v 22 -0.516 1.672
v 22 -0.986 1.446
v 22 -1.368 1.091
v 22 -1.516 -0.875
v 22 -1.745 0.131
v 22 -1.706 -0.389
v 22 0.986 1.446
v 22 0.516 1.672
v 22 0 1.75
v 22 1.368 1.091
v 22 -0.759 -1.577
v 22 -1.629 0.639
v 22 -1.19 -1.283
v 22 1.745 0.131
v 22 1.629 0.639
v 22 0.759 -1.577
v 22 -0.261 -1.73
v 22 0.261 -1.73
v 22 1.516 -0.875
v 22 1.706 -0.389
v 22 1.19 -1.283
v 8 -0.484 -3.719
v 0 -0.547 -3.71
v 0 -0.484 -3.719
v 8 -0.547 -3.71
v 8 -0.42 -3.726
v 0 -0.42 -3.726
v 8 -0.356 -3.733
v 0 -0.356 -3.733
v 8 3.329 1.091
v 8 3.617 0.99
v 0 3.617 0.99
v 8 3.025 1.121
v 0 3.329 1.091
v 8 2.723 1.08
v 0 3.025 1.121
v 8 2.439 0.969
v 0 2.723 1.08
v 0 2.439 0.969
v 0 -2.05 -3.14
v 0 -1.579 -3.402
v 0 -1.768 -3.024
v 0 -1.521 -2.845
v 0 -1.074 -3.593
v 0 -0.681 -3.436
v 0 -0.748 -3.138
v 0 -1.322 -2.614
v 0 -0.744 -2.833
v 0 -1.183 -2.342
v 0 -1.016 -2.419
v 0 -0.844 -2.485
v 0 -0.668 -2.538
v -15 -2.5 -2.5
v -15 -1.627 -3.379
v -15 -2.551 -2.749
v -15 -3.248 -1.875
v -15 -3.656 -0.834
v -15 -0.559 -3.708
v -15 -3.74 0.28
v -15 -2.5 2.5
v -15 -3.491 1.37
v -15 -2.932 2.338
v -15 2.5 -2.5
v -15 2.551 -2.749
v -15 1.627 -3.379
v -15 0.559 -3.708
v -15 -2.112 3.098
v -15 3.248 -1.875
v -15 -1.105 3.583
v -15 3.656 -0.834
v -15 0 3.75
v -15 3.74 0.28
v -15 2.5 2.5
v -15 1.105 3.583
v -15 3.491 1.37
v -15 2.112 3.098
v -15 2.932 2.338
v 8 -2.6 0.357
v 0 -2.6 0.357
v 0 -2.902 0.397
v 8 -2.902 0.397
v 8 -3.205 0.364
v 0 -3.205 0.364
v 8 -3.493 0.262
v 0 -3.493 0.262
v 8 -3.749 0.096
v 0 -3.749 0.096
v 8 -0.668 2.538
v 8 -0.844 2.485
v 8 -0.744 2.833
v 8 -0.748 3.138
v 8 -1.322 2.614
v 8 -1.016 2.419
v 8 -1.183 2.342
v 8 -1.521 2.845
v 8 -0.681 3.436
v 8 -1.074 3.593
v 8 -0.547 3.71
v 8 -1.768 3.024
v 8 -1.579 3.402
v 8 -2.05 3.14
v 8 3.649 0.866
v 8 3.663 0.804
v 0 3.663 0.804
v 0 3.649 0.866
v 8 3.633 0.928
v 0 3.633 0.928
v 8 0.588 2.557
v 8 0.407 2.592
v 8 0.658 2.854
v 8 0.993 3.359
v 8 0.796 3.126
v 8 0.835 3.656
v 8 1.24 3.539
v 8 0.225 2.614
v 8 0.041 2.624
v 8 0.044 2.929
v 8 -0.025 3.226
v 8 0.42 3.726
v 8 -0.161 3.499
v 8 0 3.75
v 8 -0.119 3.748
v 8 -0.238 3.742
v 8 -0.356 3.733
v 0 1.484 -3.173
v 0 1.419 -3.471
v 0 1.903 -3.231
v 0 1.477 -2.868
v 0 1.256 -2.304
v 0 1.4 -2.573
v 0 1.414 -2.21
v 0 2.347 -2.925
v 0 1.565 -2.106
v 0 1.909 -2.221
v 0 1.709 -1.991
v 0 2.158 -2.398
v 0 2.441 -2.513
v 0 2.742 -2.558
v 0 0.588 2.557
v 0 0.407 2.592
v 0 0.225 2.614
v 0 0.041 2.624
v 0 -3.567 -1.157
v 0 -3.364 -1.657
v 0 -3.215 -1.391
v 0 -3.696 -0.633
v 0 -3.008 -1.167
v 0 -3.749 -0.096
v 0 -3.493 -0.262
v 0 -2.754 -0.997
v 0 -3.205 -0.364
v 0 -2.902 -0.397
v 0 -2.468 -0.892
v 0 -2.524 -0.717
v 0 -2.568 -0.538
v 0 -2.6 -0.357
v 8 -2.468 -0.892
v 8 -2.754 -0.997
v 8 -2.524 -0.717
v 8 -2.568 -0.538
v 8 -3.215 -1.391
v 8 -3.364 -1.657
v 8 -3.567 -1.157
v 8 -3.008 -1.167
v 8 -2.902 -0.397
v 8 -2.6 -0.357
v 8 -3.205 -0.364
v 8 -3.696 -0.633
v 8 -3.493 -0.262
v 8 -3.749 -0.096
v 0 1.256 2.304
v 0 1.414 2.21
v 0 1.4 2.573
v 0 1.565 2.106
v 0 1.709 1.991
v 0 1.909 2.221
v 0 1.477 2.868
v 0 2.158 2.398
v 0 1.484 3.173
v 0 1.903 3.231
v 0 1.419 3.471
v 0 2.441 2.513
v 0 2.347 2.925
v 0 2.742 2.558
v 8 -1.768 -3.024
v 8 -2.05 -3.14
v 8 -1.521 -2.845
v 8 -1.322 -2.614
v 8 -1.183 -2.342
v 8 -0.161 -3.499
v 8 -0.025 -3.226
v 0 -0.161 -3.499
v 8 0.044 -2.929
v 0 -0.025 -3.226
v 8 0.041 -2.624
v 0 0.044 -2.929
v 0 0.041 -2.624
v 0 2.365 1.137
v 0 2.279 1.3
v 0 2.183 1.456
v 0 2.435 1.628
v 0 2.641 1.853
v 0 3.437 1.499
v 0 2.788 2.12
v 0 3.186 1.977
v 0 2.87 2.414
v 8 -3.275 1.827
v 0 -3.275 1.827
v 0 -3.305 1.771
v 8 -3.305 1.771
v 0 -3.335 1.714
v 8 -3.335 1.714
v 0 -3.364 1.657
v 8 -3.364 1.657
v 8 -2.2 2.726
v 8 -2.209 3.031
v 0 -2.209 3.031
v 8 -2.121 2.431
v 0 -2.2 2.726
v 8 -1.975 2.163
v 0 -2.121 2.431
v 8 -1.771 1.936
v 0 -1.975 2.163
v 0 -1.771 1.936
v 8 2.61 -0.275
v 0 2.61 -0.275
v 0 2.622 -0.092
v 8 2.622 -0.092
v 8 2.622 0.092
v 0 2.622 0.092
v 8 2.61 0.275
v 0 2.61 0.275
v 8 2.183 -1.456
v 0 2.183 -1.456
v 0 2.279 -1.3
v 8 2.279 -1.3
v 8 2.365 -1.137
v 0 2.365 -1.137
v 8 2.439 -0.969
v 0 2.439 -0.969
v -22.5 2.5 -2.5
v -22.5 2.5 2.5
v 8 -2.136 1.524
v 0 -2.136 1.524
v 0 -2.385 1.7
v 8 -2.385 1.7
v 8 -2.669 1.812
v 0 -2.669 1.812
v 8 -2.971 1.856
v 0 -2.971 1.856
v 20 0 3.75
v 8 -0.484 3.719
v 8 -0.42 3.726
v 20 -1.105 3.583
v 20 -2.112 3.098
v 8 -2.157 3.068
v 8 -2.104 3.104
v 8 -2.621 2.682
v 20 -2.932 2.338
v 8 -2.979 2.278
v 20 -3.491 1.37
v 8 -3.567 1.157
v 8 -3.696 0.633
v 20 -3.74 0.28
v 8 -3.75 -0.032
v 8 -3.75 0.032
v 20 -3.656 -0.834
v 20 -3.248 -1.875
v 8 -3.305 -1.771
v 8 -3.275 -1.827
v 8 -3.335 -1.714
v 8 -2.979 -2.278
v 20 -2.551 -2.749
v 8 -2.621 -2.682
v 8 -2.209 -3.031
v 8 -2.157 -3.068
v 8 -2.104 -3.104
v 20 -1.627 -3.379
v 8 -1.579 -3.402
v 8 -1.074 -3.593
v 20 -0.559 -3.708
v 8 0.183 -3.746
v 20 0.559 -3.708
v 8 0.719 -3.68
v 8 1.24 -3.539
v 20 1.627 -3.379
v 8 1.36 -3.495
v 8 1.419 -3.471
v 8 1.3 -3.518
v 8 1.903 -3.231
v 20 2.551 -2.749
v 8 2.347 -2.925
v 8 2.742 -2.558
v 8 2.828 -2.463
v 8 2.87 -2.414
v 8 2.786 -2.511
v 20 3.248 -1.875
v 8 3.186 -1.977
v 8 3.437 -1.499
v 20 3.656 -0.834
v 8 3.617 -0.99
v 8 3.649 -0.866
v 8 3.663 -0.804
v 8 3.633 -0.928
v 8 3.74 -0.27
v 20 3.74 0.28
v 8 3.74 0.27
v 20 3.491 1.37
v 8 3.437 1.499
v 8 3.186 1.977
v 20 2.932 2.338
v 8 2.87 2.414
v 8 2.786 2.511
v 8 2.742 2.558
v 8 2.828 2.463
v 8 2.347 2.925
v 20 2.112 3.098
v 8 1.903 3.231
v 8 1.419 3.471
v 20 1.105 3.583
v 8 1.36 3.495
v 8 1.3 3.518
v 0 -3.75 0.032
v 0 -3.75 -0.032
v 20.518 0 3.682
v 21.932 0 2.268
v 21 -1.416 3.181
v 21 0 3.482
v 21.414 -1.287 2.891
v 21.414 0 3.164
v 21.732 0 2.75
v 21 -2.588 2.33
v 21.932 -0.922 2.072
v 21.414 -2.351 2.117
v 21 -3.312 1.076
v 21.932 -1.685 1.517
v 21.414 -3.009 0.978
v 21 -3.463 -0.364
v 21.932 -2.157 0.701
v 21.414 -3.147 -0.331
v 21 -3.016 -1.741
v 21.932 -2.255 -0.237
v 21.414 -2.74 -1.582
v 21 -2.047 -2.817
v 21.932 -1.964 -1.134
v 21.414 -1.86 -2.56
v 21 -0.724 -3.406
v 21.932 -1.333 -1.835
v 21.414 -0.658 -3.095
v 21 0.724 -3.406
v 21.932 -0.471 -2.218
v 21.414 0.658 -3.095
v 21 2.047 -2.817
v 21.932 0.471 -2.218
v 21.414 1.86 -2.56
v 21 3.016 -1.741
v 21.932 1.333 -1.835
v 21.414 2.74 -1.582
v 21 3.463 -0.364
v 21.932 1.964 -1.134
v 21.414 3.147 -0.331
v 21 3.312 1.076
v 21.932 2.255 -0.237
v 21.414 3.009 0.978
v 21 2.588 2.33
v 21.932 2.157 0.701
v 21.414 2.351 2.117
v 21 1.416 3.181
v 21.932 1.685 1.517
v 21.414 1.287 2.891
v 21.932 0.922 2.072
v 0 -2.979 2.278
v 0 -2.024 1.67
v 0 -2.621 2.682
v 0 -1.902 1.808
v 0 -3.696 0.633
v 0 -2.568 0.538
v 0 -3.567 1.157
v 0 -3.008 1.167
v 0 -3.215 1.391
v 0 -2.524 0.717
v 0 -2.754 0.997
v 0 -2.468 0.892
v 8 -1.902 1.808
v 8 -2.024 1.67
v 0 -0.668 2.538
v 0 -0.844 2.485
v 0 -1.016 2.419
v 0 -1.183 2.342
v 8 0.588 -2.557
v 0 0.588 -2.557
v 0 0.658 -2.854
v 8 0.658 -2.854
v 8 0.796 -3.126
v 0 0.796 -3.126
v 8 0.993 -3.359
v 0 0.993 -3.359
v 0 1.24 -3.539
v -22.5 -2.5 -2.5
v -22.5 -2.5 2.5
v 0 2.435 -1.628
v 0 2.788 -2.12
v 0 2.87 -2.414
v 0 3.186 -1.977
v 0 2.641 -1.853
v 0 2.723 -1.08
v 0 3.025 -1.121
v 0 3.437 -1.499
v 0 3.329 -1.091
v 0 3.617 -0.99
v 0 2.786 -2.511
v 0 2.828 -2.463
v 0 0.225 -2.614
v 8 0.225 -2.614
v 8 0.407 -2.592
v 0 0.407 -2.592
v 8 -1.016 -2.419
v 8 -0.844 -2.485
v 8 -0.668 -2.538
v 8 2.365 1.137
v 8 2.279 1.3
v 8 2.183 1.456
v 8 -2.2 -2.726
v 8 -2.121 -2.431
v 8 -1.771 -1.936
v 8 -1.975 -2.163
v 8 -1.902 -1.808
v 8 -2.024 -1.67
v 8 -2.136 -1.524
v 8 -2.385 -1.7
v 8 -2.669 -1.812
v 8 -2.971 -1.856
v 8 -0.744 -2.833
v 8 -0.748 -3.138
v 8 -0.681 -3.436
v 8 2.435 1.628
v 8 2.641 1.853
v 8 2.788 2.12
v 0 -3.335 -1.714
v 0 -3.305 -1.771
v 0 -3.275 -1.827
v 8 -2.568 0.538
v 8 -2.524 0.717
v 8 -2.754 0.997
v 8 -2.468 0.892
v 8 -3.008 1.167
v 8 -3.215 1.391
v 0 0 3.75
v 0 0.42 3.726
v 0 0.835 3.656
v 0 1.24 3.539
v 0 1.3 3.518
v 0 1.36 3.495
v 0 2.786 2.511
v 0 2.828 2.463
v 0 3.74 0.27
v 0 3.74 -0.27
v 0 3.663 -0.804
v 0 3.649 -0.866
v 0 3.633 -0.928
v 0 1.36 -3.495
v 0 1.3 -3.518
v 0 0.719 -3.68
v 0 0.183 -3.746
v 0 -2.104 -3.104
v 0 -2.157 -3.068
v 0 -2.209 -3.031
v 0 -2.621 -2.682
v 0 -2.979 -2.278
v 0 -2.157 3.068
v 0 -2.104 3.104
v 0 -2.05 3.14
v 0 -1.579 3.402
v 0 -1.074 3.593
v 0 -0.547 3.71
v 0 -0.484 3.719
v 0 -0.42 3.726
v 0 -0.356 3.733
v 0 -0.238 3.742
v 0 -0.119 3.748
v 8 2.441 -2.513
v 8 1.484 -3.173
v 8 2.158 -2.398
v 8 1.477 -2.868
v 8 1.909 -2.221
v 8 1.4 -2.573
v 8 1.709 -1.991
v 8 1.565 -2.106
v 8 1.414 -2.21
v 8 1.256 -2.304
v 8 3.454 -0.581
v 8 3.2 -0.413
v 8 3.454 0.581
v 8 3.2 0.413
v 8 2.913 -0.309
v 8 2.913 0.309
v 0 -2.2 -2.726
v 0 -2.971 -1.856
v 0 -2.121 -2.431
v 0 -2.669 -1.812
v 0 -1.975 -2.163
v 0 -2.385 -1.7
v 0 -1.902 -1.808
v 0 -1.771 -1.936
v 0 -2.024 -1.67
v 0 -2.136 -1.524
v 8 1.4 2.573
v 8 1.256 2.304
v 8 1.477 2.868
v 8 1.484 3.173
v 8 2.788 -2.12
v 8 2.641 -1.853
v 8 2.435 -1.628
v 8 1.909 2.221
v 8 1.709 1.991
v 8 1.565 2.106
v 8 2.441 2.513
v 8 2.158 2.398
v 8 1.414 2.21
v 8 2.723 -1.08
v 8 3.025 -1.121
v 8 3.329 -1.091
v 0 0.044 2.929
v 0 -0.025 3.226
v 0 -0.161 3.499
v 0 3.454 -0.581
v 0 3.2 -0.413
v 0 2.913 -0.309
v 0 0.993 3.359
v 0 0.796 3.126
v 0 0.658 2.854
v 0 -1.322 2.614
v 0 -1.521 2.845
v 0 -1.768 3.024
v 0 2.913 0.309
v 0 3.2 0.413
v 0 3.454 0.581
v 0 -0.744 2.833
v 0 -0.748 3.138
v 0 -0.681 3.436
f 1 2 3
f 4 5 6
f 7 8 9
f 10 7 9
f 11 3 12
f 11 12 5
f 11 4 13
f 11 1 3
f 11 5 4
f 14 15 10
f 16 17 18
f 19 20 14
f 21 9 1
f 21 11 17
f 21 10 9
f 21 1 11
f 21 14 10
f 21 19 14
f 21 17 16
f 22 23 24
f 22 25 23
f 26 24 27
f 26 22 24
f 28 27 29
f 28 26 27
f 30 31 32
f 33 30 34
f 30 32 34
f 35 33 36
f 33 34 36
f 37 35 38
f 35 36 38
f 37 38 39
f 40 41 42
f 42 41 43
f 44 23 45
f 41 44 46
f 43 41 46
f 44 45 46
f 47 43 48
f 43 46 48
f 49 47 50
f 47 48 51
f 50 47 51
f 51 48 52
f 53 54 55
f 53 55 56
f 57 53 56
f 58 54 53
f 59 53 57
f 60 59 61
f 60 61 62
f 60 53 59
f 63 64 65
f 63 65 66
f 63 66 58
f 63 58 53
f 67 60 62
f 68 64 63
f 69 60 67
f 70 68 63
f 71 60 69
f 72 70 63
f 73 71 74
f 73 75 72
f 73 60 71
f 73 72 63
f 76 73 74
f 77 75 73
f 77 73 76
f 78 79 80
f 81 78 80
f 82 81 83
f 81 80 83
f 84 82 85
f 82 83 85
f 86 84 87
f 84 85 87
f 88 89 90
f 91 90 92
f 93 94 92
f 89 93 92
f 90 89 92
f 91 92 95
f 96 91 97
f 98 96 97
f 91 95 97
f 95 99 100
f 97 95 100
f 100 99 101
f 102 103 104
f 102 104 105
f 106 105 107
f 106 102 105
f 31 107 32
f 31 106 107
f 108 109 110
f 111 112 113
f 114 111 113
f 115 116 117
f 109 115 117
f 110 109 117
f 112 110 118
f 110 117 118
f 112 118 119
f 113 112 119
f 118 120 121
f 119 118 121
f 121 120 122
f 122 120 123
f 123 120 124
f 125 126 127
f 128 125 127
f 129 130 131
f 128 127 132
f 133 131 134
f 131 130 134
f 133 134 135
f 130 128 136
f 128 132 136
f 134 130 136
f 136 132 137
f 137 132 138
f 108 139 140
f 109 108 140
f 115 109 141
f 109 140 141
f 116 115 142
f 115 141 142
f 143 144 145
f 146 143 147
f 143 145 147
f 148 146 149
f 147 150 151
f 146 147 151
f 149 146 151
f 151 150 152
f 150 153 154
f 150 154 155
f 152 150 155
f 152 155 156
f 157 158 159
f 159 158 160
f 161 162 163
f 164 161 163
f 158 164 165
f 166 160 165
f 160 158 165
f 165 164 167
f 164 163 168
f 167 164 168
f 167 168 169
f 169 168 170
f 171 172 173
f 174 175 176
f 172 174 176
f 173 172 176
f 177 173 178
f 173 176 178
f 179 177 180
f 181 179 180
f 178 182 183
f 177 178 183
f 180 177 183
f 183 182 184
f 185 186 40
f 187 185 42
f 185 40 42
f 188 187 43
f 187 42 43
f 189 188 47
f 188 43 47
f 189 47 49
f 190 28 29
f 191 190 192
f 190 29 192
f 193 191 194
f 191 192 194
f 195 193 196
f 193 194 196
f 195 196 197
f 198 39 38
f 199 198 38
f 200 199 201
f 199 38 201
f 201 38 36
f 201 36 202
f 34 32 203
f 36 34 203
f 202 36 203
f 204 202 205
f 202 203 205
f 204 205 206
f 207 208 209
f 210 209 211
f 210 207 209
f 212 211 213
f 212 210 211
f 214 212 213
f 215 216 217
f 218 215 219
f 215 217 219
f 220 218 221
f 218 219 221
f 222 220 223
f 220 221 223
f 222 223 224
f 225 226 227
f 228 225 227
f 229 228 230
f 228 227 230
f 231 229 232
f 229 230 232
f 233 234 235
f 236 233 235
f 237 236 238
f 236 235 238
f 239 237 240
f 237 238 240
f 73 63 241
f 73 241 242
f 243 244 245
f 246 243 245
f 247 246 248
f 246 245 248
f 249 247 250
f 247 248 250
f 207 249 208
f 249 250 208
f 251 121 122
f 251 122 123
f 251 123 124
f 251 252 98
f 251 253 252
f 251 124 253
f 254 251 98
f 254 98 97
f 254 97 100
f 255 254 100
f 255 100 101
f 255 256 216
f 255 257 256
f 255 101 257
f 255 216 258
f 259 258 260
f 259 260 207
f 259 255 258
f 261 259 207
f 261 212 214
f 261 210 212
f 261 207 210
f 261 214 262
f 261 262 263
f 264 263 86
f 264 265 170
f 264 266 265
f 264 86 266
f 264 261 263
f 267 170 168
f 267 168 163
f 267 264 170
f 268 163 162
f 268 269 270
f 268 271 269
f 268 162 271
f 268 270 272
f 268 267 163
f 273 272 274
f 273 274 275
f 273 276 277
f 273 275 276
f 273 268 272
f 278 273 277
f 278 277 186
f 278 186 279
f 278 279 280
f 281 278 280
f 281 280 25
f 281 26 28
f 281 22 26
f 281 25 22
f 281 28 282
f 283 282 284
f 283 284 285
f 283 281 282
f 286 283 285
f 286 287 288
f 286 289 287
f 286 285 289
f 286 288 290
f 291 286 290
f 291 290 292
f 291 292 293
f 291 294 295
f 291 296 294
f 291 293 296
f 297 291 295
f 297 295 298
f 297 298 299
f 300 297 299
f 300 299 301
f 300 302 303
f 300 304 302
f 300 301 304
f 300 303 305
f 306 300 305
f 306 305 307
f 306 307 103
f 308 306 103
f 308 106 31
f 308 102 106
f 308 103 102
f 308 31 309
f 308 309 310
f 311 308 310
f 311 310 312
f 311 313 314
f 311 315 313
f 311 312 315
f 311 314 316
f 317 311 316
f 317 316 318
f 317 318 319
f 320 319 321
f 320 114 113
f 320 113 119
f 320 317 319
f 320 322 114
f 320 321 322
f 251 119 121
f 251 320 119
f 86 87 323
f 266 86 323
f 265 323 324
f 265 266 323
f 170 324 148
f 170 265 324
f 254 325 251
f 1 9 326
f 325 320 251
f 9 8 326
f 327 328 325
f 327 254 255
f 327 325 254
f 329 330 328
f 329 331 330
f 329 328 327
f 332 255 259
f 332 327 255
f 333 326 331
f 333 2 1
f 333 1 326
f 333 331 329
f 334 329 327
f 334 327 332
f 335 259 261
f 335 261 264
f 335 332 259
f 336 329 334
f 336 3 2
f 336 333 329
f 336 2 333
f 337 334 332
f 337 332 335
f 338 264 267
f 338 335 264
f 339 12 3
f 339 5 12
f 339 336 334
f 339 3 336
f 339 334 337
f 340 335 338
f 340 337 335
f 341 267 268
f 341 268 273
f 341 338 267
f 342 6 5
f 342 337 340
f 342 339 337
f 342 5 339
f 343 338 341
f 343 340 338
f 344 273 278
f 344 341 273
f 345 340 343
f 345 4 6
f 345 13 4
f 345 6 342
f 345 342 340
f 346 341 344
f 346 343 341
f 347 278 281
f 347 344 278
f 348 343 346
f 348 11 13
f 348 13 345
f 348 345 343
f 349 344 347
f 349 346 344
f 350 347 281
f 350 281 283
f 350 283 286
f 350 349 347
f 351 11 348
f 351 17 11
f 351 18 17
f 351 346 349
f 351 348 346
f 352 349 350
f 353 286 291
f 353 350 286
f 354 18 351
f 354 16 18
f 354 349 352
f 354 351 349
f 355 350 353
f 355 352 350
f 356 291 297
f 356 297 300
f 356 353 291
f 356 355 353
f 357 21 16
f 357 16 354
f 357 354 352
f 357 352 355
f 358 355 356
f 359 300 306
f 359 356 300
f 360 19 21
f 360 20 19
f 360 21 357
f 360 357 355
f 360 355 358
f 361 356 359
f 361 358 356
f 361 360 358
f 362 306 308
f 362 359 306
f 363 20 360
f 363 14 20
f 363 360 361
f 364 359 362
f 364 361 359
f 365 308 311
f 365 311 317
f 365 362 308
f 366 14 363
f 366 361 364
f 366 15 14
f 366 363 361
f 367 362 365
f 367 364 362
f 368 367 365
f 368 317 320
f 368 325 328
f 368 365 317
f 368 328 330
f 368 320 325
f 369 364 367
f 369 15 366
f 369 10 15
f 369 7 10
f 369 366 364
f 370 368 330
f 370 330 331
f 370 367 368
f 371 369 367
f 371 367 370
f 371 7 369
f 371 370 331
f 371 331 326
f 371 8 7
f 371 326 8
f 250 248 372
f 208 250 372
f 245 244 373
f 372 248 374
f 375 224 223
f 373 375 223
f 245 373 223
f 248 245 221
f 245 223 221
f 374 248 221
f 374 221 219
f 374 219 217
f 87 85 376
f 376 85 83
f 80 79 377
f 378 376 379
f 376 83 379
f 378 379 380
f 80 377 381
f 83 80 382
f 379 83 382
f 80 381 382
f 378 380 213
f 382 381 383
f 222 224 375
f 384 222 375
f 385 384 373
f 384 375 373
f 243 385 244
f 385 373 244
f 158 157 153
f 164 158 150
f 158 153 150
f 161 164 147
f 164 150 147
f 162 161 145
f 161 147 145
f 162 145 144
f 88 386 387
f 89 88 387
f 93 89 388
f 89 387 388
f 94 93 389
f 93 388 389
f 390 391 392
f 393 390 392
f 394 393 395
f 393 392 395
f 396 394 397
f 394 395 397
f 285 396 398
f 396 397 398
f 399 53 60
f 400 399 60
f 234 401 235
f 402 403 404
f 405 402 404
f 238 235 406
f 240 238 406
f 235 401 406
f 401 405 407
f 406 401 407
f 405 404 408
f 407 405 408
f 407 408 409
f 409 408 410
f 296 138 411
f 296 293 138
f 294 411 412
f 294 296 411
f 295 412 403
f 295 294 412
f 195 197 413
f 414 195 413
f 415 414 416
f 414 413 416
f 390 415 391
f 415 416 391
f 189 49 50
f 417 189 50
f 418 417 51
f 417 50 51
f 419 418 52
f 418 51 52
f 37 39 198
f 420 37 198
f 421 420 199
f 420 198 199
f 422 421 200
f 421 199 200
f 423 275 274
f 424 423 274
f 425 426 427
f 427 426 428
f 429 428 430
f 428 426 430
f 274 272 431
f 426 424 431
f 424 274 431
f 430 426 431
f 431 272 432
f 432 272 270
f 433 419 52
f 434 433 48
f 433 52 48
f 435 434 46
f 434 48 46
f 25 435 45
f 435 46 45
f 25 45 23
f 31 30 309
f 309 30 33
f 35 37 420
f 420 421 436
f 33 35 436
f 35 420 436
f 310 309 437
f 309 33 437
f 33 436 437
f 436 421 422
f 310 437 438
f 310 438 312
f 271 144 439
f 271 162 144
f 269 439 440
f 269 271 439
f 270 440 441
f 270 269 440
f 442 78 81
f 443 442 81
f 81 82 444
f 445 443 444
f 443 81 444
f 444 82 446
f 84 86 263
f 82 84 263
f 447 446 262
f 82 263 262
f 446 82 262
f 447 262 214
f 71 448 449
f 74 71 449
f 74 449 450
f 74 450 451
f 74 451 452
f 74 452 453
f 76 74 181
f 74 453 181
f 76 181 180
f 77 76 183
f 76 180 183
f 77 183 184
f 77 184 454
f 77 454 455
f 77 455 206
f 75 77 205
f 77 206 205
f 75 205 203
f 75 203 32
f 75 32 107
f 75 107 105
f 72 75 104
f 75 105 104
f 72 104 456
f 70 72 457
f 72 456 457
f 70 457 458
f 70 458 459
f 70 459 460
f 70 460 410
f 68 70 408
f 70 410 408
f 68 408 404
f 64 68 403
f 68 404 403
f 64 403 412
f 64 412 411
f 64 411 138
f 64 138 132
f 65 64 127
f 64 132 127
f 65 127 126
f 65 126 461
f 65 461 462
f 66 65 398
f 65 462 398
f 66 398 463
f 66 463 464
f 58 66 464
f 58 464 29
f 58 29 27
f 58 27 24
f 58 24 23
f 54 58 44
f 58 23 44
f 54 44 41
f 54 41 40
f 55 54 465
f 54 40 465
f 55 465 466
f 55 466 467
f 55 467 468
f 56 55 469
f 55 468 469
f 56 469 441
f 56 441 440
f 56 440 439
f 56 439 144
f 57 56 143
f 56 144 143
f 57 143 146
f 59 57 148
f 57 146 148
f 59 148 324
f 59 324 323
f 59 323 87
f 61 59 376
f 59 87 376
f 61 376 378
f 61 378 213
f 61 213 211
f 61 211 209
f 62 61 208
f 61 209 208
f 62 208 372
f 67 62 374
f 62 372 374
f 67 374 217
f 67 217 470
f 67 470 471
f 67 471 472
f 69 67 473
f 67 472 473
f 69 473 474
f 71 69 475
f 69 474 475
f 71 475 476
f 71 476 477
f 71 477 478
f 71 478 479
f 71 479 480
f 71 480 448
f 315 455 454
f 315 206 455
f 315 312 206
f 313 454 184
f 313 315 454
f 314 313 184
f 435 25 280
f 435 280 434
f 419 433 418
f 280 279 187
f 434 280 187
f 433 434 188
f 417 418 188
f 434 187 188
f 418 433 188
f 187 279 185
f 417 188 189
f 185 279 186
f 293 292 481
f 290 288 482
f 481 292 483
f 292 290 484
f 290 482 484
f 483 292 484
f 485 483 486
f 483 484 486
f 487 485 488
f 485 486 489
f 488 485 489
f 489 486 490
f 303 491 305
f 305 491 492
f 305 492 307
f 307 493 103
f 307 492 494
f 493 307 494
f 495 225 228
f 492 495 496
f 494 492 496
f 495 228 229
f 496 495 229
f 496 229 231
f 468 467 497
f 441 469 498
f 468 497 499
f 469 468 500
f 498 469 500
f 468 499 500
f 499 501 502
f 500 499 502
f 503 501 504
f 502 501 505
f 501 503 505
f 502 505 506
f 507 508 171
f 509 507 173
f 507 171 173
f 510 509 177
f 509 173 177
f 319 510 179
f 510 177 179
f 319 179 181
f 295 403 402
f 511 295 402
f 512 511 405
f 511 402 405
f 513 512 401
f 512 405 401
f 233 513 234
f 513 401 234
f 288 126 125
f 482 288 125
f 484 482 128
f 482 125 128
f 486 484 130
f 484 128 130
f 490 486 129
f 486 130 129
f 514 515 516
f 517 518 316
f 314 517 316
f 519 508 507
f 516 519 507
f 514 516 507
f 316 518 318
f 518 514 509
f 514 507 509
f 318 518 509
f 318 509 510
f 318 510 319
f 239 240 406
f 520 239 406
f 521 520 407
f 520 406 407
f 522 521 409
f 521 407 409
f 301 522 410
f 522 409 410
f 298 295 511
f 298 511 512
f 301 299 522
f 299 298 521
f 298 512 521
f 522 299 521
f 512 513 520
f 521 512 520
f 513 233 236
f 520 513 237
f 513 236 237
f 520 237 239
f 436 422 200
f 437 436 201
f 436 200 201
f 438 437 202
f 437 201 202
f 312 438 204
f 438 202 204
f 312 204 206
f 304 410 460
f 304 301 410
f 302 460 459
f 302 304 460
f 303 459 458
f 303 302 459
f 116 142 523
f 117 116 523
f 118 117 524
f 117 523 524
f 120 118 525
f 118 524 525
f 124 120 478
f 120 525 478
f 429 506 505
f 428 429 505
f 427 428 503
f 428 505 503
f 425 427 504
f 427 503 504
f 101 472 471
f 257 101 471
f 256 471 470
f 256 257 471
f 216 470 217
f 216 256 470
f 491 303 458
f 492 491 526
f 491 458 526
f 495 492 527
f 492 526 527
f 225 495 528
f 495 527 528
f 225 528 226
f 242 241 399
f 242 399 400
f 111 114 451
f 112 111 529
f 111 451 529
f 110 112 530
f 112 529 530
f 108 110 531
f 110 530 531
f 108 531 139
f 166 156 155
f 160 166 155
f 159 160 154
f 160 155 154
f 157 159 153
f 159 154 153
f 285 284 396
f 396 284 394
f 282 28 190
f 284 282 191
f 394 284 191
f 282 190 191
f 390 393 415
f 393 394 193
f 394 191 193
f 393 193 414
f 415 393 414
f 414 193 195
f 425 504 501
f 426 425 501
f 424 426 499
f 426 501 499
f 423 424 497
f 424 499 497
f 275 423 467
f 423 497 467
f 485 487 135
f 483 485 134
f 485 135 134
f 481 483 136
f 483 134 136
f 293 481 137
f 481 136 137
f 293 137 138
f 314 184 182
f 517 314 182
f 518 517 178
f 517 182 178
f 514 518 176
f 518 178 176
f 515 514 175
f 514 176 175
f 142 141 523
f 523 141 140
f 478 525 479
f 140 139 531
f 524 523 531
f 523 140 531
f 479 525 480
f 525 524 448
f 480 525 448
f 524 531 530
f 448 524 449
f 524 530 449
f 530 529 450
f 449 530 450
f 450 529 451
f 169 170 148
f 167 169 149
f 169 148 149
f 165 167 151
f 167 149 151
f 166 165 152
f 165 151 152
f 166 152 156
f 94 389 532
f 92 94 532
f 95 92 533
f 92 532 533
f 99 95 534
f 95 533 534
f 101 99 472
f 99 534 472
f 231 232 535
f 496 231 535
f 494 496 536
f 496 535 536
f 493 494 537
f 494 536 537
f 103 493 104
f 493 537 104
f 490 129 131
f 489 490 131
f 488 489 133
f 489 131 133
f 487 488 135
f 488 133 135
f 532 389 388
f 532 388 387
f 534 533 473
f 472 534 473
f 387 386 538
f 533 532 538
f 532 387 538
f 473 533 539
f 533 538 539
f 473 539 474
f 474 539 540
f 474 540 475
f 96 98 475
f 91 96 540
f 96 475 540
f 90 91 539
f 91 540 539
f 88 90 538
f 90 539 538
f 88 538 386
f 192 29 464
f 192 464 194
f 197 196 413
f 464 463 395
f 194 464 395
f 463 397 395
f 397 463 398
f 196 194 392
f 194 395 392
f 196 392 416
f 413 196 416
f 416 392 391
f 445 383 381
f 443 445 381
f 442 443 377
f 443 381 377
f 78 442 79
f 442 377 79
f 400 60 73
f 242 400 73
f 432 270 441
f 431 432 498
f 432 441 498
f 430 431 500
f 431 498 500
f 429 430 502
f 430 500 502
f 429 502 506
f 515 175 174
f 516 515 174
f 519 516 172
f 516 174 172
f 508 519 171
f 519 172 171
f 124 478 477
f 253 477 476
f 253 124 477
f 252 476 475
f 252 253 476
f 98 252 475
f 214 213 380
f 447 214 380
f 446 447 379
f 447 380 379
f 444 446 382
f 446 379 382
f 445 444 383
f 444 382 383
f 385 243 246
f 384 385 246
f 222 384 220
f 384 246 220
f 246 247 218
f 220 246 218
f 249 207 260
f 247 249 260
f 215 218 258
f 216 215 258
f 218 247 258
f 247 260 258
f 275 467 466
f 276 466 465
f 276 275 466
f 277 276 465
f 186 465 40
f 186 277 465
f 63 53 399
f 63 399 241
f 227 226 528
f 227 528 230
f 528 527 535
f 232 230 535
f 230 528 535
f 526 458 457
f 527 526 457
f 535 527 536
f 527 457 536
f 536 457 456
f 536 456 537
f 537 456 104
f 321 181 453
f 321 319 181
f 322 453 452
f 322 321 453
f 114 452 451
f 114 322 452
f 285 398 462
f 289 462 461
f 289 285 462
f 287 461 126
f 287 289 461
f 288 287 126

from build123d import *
from build123d.topology import SkipClean

# Parameters (mm, degrees)
BASPROSKE_W         = 8
BASPROSKE_H         = 3.75
TOOTHCUT_DEPTH      = 10.59817691
TEETHCUTS_COUNT     = 13
TEETHCUTS_ANGLE     = 332.307692308
BORSKE_R            = 0.4
BORE_DEPTH          = 50.0000508
SKETCH3_R           = 3.75
BOSS_EXTRUDE3_DEPTH = 15
SKETCH4_W           = 5
SKETCH4_H           = 5
BOSS_EXTRUDE4_DEPTH = 7.5
BOSS_EXTRUDE5_START = 14
SKETCH5_R           = 3.75
BOSS_EXTRUDE5_DEPTH = 14
FILLET1_R           = 2
SKETCH8_R           = 1.303262777
BOSS_EXTRUDE8_DEPTH = 30


with BuildPart() as part:
    # BasProSke → Base-Revolve (revolve)
    with BuildSketch(Plane(origin=(0, 0, 0), x_dir=(1, 0, 0), z_dir=(0, 1, 0))):
        with Locations((4, 1.875)):
            Rectangle(BASPROSKE_W, BASPROSKE_H)
    revolve(axis=Axis((-10, 0, 0), (1, 0, 0)))

    # TooCutSke → ToothCut (cut, through all)
    with BuildSketch(Plane(origin=(0, 0, 0), x_dir=(0, 0, -1), z_dir=(1, 0, 0))):
        with BuildLine():
            ThreePointArc((0.275247387, 2.609523879), (0, 2.624), (-0.275247387, 2.609523879))
            ThreePointArc((-0.275247387, 2.609523879), (-0.421084752, 3.214694797), (-0.831556081, 3.682683756))
            ThreePointArc((-0.831556081, 3.682683756), (0, 3.7754), (0.831556081, 3.682683756))
            ThreePointArc((0.831556081, 3.682683756), (0.421084752, 3.214694797), (0.275247387, 2.609523879))
        make_face()
    toothcut = extrude(amount=TOOTHCUT_DEPTH, mode=Mode.SUBTRACT)

    # TeethCuts: ToothCut ×13 about axis
    teethcuts_axis = Axis((-10, 0, 0), (1, 0, 0))
    for i in range(1, TEETHCUTS_COUNT):
        add(toothcut.rotate(teethcuts_axis, i * TEETHCUTS_ANGLE / (TEETHCUTS_COUNT - 1)), mode=Mode.SUBTRACT)

    # BorSke → Bore (cut, symmetric)
    with BuildSketch(Plane(origin=(0, 0, 0), x_dir=(0, 0, -1), z_dir=(1, 0, 0))):
        Circle(BORSKE_R)
    extrude(amount=BORE_DEPTH, both=True, mode=Mode.SUBTRACT)

    # Sketch3 → Boss-Extrude3 (add)
    with SkipClean():  # the faces are left unmerged after this step: merging them gives an invalid solid
        with BuildSketch(Plane.ZY):
            Circle(SKETCH3_R)
        extrude(amount=BOSS_EXTRUDE3_DEPTH)

    # Sketch4 → Boss-Extrude4 (add)
    with SkipClean():  # the faces are left unmerged after this step: merging them gives an invalid solid
        with BuildSketch(Plane.ZY.offset(15)):
            Rectangle(SKETCH4_W, SKETCH4_H)
        extrude(amount=BOSS_EXTRUDE4_DEPTH)

    # Sketch5 → Boss-Extrude5 (add)
    with BuildSketch(Plane(origin=(8, 0, 0), x_dir=(0, 0, -1), z_dir=(1, 0, 0)).offset(BOSS_EXTRUDE5_START)):
        Circle(SKETCH5_R)
    extrude(amount=-BOSS_EXTRUDE5_DEPTH)

    # Fillet1
    fillet1_edges = [part.edges().sort_by_distance(p)[0] for p in [
        (22, 0, 3.75),
    ]]
    fillet(fillet1_edges, radius=FILLET1_R)

    # Sketch8 → Boss-Extrude8 (add)
    with BuildSketch(Plane(origin=(22, 0, 0), x_dir=(0, 0, -1), z_dir=(1, 0, 0))):
        Circle(SKETCH8_R)
    extrude(amount=-BOSS_EXTRUDE8_DEPTH)


solid = part.part
